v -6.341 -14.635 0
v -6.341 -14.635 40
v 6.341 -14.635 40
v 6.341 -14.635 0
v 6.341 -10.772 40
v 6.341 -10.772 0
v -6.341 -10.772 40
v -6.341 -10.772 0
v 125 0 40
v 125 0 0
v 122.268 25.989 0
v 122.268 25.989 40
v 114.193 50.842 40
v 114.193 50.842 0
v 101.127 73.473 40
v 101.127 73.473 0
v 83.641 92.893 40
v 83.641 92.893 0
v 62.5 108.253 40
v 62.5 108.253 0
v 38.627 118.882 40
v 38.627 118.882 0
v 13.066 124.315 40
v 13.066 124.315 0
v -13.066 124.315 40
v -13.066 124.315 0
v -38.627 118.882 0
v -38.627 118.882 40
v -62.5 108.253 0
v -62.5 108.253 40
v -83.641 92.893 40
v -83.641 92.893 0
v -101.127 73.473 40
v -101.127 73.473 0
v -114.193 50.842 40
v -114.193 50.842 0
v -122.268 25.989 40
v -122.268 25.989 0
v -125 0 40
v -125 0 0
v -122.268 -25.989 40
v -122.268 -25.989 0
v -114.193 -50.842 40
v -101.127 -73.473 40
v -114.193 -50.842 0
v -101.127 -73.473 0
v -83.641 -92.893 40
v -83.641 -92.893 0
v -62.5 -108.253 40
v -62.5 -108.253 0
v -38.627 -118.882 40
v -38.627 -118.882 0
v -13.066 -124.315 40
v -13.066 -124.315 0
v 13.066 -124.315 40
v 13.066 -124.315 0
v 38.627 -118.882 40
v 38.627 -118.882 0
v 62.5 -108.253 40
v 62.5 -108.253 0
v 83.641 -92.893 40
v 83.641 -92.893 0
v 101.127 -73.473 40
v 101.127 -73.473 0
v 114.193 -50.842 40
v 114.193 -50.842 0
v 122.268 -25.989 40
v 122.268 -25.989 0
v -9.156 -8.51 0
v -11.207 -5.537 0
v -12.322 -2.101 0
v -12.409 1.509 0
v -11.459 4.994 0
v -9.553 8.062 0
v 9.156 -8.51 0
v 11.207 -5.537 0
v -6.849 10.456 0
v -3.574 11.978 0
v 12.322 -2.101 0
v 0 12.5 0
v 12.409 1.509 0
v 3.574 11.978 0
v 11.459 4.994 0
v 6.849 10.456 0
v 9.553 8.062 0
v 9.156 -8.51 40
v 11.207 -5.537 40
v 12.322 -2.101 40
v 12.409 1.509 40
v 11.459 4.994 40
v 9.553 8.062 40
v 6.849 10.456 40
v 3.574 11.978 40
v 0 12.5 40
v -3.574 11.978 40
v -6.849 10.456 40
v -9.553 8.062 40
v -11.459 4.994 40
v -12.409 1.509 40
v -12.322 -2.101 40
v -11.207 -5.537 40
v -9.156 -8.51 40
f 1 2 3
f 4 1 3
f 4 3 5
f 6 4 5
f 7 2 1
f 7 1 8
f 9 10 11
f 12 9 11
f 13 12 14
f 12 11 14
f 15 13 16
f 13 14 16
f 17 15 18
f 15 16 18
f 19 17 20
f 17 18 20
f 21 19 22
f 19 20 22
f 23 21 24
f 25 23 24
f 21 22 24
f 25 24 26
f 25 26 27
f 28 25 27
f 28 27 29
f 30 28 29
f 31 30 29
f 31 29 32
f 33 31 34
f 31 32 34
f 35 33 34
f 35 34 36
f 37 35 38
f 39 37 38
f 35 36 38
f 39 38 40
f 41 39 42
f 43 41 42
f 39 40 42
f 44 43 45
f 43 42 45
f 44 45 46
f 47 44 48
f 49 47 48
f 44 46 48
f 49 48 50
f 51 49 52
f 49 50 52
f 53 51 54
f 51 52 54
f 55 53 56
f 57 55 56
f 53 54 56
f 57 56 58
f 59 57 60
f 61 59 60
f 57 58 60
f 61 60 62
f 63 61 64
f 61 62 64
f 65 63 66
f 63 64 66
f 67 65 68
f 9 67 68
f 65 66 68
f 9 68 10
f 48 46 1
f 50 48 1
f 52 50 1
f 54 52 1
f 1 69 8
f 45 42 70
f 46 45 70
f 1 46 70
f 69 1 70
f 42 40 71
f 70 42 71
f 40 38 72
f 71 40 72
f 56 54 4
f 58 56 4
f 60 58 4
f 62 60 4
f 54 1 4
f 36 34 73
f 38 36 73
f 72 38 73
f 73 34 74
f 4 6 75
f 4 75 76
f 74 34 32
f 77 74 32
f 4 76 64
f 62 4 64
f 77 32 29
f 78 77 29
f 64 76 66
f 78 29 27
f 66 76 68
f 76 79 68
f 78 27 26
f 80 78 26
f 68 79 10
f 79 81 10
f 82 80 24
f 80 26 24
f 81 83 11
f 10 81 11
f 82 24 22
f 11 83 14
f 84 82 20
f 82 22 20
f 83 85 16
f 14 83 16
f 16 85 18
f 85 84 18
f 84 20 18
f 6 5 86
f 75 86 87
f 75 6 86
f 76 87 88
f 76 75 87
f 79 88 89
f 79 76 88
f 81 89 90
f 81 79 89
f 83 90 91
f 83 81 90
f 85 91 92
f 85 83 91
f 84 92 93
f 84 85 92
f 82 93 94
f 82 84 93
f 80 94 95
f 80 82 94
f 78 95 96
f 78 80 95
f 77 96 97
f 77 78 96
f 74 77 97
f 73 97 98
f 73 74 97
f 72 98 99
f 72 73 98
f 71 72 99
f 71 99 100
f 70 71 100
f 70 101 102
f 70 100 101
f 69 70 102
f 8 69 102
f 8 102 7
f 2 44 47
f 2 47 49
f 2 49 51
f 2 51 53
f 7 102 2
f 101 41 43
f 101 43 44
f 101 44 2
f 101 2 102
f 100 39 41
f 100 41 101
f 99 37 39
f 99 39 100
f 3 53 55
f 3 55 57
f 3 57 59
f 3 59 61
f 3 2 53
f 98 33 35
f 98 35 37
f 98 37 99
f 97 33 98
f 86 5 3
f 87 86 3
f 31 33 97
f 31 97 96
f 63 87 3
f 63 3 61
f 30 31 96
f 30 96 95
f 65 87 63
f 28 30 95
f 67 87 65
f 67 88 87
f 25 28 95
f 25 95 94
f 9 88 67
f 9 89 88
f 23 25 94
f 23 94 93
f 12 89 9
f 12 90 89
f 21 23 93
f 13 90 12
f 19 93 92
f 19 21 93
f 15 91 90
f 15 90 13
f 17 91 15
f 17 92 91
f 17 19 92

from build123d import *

# Parameters (mm, degrees)
SKETCH1_R           = 125
SKETCH1_R_2         = 12.5
BOSS_EXTRUDE1_DEPTH = 40
CUT_EXTRUDE1_REACH  = 183.246
SKETCH2_W           = 12.682043214
SKETCH2_H           = 5.67447182


with BuildPart() as part:
    # Sketch1 → Boss-Extrude1 (new body)
    with BuildSketch(Plane.XY):
        Circle(SKETCH1_R)
        Circle(SKETCH1_R_2, mode=Mode.SUBTRACT)
    extrude(amount=BOSS_EXTRUDE1_DEPTH)

    # Sketch2 → Cut-Extrude1 (cut, up to next)
    with BuildSketch(Plane.XY.offset(40), mode=Mode.PRIVATE) as cut_extrude1_sk1:
        with Locations((0, -11.797375137)):
            Rectangle(SKETCH2_W, SKETCH2_H)
    cut_extrude1_tool1 = extrude(cut_extrude1_sk1.sketch, amount=-CUT_EXTRUDE1_REACH, mode=Mode.PRIVATE) & part.part
    add(cut_extrude1_tool1.solids().sort_by_distance((0, -11.797375, 40))[0], mode=Mode.SUBTRACT)


solid = part.part
